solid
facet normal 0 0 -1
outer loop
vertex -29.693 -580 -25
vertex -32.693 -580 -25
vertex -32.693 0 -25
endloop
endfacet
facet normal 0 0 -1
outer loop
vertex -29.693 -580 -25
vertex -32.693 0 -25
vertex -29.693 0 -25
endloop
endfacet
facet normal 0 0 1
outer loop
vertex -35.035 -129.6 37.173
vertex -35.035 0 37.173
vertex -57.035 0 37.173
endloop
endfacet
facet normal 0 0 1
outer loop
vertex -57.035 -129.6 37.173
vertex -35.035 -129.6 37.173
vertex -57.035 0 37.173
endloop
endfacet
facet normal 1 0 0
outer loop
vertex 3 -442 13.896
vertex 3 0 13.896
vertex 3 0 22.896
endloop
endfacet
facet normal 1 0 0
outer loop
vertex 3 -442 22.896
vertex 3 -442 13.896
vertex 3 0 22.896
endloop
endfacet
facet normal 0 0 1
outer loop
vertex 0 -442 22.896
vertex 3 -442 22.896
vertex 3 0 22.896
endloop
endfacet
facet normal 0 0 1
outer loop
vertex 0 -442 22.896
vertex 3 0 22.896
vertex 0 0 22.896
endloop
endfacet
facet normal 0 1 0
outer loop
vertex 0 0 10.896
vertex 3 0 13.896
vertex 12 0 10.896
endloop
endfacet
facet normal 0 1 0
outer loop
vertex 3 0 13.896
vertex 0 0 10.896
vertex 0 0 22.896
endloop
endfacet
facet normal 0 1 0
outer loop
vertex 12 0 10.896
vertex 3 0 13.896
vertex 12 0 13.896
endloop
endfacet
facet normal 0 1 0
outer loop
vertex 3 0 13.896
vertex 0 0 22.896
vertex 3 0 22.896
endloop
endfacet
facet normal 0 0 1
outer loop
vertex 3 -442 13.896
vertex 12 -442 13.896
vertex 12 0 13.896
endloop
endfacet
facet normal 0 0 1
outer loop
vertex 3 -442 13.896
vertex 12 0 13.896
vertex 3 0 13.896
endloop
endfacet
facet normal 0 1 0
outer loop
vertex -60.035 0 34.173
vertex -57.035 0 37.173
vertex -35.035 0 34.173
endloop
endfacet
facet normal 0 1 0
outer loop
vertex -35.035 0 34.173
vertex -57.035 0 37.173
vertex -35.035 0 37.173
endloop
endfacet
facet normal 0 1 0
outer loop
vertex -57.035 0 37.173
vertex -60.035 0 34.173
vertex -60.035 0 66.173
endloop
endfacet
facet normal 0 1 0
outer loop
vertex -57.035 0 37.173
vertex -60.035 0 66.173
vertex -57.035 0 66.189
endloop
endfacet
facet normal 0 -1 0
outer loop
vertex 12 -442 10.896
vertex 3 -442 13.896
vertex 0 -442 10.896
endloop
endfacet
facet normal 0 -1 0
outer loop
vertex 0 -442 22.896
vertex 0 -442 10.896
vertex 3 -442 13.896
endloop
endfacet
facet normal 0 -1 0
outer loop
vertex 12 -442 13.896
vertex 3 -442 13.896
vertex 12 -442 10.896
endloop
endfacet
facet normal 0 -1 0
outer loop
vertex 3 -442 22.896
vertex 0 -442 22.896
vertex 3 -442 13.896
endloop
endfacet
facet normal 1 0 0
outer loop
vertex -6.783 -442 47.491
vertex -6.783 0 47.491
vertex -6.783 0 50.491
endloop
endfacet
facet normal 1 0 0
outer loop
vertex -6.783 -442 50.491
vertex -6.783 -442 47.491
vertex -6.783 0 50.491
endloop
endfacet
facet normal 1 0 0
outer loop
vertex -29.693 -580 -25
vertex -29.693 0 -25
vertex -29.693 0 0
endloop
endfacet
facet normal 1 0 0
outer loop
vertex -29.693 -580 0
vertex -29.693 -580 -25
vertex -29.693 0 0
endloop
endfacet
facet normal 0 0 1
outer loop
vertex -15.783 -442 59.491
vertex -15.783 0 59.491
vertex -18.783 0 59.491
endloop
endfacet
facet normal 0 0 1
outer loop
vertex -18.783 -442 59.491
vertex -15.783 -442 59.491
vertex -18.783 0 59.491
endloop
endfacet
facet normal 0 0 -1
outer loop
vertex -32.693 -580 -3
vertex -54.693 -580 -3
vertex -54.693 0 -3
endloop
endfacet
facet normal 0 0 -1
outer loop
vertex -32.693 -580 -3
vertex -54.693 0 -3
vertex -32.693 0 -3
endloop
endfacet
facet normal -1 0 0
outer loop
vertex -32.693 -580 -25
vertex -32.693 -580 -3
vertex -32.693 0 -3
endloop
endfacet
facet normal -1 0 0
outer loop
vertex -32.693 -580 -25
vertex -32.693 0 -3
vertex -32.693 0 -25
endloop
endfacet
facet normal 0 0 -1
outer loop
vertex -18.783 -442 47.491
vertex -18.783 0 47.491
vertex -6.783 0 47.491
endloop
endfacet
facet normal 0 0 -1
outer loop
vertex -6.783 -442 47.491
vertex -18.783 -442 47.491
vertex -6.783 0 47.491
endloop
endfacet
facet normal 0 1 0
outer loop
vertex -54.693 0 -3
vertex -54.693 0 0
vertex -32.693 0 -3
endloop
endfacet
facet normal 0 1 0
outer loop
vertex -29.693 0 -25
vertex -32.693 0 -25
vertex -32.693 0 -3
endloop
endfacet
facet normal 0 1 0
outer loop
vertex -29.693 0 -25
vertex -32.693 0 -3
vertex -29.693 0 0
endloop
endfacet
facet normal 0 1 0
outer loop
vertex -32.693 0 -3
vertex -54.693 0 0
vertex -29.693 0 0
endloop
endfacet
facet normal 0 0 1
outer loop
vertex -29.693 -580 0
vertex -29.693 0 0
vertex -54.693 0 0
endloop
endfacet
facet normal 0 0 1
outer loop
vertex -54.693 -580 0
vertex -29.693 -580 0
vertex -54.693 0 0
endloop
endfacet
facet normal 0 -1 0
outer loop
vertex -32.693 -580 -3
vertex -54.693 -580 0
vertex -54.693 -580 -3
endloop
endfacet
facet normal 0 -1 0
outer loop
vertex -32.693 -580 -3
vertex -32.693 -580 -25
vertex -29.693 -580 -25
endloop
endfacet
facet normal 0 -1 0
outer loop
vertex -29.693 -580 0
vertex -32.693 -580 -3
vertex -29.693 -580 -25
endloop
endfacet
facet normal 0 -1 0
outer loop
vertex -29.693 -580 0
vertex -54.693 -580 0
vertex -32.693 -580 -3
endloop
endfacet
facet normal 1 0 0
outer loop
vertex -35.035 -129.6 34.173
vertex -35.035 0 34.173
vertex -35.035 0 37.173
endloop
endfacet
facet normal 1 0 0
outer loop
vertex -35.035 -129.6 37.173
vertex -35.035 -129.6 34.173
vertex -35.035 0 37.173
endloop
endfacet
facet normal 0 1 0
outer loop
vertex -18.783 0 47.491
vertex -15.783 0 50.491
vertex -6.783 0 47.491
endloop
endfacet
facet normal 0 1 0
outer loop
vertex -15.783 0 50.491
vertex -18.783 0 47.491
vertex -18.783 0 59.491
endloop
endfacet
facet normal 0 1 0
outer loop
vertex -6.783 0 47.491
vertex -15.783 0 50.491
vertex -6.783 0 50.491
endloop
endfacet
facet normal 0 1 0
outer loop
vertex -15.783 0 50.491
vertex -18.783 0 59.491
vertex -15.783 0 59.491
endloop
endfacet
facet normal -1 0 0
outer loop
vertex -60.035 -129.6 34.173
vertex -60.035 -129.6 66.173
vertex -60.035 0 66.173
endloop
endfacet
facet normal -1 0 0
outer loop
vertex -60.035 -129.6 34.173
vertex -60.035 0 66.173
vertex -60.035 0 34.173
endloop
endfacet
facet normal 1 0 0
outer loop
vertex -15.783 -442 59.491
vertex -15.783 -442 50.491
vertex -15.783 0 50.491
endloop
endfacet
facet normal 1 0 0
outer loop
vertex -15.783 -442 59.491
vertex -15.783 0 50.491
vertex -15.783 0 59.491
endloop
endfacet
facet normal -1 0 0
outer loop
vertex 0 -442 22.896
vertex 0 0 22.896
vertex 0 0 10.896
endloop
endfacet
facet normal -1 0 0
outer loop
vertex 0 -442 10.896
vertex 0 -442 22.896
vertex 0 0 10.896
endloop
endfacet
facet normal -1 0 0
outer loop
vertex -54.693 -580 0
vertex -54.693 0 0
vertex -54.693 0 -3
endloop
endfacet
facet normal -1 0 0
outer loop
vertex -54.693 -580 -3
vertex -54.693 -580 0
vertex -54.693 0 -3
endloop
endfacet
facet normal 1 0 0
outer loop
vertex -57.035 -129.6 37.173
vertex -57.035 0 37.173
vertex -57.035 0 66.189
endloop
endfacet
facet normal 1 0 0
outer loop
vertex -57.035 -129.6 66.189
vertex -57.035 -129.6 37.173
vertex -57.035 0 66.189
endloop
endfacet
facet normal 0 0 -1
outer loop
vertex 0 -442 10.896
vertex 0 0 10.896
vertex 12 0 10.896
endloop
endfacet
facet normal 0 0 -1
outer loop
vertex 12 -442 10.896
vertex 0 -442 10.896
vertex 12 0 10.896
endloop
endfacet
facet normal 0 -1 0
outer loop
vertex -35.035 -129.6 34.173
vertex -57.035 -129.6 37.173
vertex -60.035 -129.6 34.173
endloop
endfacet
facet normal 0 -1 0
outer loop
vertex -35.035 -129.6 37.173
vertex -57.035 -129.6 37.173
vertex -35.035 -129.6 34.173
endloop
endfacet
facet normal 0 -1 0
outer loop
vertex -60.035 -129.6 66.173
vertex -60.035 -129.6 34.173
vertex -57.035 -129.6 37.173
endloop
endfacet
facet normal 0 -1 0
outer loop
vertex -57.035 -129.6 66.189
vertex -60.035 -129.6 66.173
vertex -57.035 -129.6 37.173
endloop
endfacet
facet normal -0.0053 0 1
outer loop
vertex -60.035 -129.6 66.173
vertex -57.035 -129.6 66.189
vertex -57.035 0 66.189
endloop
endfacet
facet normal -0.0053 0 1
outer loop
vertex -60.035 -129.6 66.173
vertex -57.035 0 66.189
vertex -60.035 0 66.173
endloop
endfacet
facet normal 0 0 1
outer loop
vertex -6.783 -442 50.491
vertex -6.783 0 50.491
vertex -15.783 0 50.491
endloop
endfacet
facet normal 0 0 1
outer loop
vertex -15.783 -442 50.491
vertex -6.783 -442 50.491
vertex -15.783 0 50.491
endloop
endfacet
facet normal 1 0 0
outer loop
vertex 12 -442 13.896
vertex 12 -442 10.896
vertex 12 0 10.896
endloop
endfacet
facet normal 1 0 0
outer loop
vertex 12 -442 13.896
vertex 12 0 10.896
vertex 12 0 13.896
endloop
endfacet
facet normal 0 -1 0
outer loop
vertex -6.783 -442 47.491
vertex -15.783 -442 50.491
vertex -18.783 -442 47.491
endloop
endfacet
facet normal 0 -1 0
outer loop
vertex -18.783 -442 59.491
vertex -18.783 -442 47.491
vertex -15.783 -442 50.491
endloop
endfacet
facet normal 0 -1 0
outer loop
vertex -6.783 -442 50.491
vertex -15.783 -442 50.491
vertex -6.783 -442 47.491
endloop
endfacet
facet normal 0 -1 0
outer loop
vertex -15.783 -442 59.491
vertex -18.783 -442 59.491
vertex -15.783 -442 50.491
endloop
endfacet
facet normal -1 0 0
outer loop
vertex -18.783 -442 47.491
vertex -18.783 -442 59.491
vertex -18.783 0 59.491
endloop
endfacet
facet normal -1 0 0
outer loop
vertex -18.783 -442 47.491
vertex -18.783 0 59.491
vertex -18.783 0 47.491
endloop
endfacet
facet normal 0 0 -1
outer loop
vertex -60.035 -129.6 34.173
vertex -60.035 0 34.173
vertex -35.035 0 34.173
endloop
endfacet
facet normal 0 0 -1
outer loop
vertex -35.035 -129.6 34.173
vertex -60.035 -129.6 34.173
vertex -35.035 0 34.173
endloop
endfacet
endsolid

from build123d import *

# Parameters (mm, degrees)
F1_DEPTH = 129.6
F3_DEPTH = 442
F5_DEPTH = 442
F7_DEPTH = 580


with BuildPart() as f1:
    # F0 (on Front) → F1 (new body)
    with BuildSketch(Plane.XZ):
        Polygon((-57.035193, 66.189003), (-60.035149, 66.172745), (-60.035149, 34.172745), (-35.035149, 34.172745), (-35.035149, 37.172745), (-57.035193, 37.172745), align=None)
    extrude(amount=F1_DEPTH)


with BuildPart() as f3:
    # F2 (on Front) → F3 (new body)
    with BuildSketch(Plane.XZ):
        Polygon((0, 22.896226), (0, 10.896226), (12, 10.896226), (12, 13.896226), (3, 13.896226), (3, 22.896226), align=None)
    extrude(amount=F3_DEPTH)


with BuildPart() as f5:
    # F4 (on Front) → F5 (new body)
    with BuildSketch(Plane.XZ):
        Polygon((-15.782848, 59.490555), (-18.782848, 59.490555), (-18.782848, 47.490555), (-6.782848, 47.490555), (-6.782848, 50.490555), (-15.782848, 50.490555), align=None)
    extrude(amount=F5_DEPTH)


with BuildPart() as f7:
    # F6 (on Front) → F7 (new body)
    with BuildSketch(Plane.XZ):
        Polygon((-29.692831, 0), (-54.692831, 0), (-54.692831, -3), (-32.692831, -3), (-32.692831, -25), (-29.692831, -25), align=None)
    extrude(amount=F7_DEPTH)


solid = Compound([f1.part, f3.part, f5.part, f7.part])
